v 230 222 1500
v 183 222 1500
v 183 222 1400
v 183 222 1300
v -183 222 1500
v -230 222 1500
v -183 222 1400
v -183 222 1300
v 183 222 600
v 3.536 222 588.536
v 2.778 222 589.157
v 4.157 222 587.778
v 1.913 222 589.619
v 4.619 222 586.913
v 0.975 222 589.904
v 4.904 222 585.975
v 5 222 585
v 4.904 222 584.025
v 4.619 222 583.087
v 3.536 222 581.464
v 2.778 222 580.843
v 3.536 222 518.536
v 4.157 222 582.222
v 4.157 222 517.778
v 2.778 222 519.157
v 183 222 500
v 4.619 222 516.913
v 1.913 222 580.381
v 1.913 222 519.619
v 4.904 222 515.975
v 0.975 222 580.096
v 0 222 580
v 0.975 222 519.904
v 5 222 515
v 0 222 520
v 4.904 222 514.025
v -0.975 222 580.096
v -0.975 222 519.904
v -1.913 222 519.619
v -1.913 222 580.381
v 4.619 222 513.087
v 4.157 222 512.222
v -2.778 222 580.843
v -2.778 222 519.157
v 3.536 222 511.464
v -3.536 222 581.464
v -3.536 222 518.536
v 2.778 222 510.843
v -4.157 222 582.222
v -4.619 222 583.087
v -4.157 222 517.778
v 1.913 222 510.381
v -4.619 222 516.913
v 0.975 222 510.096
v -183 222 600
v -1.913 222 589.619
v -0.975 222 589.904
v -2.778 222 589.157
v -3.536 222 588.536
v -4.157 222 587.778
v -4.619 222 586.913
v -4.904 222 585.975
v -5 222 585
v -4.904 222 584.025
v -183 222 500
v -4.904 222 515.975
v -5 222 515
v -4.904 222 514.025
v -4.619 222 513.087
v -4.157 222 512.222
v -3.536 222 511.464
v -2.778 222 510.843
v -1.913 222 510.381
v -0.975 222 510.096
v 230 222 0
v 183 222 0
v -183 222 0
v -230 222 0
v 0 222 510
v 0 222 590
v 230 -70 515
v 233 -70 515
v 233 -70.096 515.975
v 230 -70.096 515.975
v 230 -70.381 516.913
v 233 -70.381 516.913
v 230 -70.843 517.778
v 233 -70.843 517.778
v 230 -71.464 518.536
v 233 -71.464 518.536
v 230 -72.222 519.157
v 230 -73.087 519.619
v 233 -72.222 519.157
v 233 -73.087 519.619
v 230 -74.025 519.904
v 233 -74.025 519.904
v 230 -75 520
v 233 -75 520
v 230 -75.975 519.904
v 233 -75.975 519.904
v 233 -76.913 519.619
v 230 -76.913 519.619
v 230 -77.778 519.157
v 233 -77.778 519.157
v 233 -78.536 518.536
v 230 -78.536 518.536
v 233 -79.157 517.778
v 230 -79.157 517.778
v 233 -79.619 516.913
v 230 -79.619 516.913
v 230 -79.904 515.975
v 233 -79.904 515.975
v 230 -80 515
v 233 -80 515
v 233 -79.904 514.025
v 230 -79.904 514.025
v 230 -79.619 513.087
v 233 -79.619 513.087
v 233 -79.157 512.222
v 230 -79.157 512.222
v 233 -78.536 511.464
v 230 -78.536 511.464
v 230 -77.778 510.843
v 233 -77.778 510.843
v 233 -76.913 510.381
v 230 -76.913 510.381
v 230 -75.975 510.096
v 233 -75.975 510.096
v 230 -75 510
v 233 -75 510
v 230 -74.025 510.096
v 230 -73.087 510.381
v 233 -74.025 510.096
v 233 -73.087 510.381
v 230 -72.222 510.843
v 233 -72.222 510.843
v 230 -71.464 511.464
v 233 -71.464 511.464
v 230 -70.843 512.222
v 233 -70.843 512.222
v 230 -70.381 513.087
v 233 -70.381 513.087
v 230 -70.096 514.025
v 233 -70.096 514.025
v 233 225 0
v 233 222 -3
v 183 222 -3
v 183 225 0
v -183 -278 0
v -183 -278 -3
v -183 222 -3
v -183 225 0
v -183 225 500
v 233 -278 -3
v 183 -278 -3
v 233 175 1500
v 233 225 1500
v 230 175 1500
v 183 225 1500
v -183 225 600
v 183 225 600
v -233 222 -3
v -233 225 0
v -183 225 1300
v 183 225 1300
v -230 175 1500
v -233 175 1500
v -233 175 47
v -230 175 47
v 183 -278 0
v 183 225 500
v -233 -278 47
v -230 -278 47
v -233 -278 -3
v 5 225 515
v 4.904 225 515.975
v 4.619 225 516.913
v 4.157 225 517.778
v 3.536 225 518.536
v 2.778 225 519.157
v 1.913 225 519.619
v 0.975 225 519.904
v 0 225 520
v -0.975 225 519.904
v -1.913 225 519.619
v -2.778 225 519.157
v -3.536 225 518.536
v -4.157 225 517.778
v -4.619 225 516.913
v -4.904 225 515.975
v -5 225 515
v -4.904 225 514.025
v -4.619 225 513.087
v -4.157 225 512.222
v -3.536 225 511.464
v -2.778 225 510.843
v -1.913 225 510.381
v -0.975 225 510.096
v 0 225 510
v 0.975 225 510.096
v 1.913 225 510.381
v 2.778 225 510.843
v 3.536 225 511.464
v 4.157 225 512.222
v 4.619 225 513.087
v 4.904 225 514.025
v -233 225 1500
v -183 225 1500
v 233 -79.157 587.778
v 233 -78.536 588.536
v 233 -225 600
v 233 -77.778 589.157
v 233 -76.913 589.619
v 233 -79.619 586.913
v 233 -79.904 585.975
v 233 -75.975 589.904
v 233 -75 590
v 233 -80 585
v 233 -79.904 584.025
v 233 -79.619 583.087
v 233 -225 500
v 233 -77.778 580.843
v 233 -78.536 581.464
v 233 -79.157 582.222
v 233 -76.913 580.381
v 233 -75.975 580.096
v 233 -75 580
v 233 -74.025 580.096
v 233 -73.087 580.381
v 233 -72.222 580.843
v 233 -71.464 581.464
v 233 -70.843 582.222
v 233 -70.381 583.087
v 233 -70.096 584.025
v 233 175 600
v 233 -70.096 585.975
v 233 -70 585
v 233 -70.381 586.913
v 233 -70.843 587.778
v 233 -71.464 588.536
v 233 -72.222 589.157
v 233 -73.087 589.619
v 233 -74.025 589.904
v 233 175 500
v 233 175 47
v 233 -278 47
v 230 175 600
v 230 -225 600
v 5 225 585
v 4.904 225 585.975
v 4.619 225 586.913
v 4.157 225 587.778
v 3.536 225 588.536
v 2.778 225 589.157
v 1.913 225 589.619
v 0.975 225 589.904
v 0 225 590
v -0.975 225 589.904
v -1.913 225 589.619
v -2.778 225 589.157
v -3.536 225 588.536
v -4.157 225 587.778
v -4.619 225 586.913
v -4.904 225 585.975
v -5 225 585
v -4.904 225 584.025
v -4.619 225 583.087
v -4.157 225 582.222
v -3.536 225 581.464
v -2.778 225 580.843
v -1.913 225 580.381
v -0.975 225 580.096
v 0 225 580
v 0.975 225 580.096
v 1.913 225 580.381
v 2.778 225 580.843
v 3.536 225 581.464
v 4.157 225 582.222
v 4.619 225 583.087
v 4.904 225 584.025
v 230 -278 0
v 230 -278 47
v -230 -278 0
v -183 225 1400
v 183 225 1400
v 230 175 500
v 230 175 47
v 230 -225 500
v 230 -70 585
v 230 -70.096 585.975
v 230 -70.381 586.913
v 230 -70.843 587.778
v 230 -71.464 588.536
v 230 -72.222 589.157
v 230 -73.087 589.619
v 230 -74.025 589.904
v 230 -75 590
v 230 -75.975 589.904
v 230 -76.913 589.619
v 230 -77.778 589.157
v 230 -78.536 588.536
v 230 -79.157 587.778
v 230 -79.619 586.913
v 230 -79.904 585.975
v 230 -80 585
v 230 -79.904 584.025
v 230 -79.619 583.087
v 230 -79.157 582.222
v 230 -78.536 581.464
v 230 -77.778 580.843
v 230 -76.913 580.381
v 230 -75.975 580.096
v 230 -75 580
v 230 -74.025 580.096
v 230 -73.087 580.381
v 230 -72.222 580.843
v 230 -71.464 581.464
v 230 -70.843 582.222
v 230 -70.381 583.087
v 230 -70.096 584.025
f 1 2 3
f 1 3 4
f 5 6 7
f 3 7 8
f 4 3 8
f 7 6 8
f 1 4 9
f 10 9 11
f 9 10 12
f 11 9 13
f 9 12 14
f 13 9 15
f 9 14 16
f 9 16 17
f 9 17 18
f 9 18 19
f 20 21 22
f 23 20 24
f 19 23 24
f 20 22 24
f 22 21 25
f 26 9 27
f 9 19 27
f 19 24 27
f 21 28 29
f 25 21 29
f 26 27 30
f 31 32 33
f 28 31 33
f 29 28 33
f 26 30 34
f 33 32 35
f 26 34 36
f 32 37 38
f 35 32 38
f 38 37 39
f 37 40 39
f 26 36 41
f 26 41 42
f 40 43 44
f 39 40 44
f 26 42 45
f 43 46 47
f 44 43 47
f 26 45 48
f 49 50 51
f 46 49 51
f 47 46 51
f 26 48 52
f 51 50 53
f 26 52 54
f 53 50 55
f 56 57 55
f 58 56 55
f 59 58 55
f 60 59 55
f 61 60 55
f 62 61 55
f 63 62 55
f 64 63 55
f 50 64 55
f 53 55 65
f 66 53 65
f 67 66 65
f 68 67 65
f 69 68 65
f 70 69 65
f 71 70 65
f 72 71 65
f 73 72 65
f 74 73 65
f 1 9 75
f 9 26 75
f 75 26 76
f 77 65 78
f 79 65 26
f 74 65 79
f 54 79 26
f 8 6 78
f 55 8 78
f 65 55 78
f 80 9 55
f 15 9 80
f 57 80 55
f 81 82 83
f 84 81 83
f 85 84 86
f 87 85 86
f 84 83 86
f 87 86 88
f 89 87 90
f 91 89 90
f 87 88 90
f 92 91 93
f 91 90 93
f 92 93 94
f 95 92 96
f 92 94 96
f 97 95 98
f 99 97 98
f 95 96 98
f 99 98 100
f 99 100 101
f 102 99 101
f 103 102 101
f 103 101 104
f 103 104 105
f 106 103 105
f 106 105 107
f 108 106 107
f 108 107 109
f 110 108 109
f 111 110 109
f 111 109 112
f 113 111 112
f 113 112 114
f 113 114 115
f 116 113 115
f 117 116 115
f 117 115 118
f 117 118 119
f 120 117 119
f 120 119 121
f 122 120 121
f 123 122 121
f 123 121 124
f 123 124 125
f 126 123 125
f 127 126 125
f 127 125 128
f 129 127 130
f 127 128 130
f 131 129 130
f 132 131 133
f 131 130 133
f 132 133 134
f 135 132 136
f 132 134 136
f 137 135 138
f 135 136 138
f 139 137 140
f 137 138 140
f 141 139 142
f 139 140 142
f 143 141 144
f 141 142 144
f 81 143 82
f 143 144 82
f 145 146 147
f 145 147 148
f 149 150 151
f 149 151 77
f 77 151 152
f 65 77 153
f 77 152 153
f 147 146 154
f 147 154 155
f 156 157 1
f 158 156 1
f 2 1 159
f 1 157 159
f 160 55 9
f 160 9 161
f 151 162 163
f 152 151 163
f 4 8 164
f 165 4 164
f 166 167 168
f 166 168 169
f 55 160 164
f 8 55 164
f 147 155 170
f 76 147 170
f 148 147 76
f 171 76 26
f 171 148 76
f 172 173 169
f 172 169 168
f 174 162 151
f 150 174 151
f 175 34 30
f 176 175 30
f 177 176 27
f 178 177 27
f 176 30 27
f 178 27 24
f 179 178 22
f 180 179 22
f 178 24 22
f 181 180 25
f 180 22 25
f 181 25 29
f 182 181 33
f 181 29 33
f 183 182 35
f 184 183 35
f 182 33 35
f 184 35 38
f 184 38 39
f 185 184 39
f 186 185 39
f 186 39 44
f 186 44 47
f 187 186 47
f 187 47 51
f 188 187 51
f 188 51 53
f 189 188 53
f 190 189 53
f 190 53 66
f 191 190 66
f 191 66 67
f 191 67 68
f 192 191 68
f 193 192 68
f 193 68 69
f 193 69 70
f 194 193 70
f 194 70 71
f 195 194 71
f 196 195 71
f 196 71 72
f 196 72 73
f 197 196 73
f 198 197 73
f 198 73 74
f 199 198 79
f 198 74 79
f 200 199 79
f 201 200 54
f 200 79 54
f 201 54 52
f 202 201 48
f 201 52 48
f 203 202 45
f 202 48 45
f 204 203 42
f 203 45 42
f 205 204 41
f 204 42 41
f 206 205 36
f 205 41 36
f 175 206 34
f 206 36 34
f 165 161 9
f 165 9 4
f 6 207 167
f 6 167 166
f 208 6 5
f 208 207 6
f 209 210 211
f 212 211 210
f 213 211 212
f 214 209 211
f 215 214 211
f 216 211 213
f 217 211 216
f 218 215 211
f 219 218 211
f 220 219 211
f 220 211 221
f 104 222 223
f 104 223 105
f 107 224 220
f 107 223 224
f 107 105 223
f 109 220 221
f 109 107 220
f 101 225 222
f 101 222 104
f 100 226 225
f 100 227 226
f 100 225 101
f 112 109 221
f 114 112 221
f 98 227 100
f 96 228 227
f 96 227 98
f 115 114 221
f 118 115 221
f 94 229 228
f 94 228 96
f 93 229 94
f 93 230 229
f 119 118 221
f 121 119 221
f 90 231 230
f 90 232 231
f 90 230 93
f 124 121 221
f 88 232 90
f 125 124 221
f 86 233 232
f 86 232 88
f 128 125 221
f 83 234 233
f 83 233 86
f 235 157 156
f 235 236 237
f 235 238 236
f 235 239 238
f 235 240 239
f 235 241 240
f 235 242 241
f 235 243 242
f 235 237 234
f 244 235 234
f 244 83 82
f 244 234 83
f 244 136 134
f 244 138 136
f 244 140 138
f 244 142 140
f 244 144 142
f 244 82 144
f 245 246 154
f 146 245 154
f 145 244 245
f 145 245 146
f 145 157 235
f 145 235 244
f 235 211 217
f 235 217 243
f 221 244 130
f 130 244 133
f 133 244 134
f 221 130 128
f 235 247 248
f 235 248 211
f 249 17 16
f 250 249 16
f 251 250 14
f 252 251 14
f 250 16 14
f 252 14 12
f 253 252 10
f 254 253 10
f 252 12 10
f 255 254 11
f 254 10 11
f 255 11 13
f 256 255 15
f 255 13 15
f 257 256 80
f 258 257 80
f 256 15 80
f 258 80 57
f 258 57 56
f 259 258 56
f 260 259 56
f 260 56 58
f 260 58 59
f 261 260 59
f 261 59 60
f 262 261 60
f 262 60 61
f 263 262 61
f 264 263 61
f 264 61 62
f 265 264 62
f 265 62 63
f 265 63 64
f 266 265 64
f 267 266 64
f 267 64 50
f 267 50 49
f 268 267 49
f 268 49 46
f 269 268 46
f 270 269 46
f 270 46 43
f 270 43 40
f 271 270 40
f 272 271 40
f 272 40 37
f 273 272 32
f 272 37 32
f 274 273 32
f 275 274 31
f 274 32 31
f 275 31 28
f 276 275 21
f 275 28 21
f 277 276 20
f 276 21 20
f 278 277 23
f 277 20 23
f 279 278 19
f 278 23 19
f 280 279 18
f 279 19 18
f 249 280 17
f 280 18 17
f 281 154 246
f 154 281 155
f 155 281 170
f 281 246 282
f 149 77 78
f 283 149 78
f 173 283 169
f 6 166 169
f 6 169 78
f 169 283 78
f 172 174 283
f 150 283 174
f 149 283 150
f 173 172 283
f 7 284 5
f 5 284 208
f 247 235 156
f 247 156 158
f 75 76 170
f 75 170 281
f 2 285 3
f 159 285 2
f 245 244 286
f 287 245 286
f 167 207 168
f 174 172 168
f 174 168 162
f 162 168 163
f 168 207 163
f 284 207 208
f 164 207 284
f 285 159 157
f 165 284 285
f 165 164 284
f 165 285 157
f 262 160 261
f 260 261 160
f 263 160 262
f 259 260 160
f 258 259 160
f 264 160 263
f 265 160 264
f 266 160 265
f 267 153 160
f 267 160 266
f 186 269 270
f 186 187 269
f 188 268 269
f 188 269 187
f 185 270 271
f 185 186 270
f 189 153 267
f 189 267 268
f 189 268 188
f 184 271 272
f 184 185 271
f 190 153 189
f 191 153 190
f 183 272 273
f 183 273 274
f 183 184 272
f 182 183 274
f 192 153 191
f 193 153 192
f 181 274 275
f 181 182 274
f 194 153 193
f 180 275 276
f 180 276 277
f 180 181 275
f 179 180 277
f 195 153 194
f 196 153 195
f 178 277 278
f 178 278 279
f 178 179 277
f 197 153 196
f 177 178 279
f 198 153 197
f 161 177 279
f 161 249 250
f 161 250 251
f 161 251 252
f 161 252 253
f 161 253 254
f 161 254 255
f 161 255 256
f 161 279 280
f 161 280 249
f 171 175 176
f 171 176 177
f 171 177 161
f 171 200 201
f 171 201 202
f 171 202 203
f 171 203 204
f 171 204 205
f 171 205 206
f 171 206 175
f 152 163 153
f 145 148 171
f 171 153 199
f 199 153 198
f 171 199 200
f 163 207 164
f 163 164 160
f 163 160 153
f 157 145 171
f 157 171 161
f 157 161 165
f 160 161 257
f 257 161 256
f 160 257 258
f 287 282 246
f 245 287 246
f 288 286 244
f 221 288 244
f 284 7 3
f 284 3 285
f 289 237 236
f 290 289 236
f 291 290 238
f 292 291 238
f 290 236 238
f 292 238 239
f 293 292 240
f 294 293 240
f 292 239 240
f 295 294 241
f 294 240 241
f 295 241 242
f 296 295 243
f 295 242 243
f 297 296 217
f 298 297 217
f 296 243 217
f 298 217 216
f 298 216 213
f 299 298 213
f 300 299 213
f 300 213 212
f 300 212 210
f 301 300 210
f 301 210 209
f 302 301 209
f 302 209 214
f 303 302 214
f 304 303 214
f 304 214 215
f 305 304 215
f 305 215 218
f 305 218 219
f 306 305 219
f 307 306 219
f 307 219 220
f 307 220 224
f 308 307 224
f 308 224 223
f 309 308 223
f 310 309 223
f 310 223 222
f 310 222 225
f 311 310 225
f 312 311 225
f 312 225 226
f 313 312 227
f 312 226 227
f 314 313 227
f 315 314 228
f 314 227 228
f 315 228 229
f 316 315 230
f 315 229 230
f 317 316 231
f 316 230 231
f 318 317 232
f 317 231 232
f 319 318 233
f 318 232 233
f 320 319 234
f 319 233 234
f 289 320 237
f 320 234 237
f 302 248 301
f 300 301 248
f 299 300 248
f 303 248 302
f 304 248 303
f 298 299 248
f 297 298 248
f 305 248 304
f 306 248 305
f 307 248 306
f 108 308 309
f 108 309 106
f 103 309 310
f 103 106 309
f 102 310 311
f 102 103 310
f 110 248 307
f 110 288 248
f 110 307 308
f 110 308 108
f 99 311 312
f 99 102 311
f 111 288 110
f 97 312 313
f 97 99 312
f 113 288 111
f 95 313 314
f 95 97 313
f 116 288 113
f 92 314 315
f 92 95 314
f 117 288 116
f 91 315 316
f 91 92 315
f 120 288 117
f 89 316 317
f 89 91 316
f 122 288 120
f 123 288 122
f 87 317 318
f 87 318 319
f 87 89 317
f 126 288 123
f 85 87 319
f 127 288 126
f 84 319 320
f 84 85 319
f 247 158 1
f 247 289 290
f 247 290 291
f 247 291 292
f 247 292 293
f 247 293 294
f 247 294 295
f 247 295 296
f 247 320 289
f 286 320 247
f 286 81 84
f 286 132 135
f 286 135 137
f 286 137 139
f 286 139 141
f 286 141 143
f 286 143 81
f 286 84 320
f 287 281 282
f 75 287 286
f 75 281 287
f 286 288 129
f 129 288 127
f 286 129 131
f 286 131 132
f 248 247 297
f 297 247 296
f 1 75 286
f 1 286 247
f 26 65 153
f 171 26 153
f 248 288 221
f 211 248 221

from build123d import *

# Parameters (mm, degrees)
F1_DEPTH  = 1500
F3_DEPTH  = 50
F5_DEPTH  = 500
F6_W      = 3
F6_H      = 100
F9_DEPTH  = 366
F10_R     = 5
F11_DEPTH = 25
F12_W     = 3
F12_H     = 100
F13_DEPTH = 400
F14_R     = 5
F15_DEPTH = 25


with BuildPart() as f1:
    # F0 (on Top) → F1 (new body)
    with BuildSketch(Plane.XY):
        Polygon((-183, 225), (-233, 225), (-233, 175), (-230, 175), (-230, 222), (-183, 222), align=None)
    extrude(amount=F1_DEPTH)

    # F2 (on face) → F3 (join)
    with BuildSketch(Plane.YZ.offset(-183)):
        Polygon((225, 0), (222, 0), (222, -3), align=None)
    extrude(amount=-F3_DEPTH)

    # F4 (on face) → F5 (join)
    with BuildSketch(Plane.XZ.offset(-222)):
        Polygon((-233, 47), (-233, -3), (-183, -3), (-183, 0), (-230, 0), (-230, 47), align=None)
    extrude(amount=F5_DEPTH)


with BuildPart() as f8_1:
    # F8: instance of F1
    add(f1.part.mirror(Plane(origin=(0, 140.5122887865, 581.4877112135), x_dir=(0, 1, 0), z_dir=(1, 0, 0))))


with BuildPart() as f1_1:
    add(f1.part)

    add(f8_1.part)  # F9 merges F8_1
    # F6 (on face) → F9 (join, through all)
    with BuildSketch(Plane.YZ.offset(-183)):
        with Locations((223.5, 1350)):
            Rectangle(F6_W, F6_H)
        with Locations((223.5, 550)):
            Rectangle(F6_W, F6_H)
    extrude(amount=F9_DEPTH)

    # F10 (on face) → F11 (cut)
    with BuildSketch(Plane.XZ.offset(-222)):
        with Locations((0, 585)):
            Circle(F10_R)
        with Locations((0, 515)):
            Circle(F10_R)
    extrude(amount=-F11_DEPTH, mode=Mode.SUBTRACT)

    # F12 (on face) → F13 (join)
    with BuildSketch(Plane.XZ.offset(-175)):
        with Locations((231.5, 550)):
            Rectangle(F12_W, F12_H)
    extrude(amount=F13_DEPTH)

    # F14 (on face) → F15 (cut)
    with BuildSketch(Plane.YZ.offset(233)):
        with Locations((-75, 585)):
            Circle(F14_R)
        with Locations((-75, 515)):
            Circle(F14_R)
    extrude(amount=-F15_DEPTH, mode=Mode.SUBTRACT)


solid = f1_1.part
